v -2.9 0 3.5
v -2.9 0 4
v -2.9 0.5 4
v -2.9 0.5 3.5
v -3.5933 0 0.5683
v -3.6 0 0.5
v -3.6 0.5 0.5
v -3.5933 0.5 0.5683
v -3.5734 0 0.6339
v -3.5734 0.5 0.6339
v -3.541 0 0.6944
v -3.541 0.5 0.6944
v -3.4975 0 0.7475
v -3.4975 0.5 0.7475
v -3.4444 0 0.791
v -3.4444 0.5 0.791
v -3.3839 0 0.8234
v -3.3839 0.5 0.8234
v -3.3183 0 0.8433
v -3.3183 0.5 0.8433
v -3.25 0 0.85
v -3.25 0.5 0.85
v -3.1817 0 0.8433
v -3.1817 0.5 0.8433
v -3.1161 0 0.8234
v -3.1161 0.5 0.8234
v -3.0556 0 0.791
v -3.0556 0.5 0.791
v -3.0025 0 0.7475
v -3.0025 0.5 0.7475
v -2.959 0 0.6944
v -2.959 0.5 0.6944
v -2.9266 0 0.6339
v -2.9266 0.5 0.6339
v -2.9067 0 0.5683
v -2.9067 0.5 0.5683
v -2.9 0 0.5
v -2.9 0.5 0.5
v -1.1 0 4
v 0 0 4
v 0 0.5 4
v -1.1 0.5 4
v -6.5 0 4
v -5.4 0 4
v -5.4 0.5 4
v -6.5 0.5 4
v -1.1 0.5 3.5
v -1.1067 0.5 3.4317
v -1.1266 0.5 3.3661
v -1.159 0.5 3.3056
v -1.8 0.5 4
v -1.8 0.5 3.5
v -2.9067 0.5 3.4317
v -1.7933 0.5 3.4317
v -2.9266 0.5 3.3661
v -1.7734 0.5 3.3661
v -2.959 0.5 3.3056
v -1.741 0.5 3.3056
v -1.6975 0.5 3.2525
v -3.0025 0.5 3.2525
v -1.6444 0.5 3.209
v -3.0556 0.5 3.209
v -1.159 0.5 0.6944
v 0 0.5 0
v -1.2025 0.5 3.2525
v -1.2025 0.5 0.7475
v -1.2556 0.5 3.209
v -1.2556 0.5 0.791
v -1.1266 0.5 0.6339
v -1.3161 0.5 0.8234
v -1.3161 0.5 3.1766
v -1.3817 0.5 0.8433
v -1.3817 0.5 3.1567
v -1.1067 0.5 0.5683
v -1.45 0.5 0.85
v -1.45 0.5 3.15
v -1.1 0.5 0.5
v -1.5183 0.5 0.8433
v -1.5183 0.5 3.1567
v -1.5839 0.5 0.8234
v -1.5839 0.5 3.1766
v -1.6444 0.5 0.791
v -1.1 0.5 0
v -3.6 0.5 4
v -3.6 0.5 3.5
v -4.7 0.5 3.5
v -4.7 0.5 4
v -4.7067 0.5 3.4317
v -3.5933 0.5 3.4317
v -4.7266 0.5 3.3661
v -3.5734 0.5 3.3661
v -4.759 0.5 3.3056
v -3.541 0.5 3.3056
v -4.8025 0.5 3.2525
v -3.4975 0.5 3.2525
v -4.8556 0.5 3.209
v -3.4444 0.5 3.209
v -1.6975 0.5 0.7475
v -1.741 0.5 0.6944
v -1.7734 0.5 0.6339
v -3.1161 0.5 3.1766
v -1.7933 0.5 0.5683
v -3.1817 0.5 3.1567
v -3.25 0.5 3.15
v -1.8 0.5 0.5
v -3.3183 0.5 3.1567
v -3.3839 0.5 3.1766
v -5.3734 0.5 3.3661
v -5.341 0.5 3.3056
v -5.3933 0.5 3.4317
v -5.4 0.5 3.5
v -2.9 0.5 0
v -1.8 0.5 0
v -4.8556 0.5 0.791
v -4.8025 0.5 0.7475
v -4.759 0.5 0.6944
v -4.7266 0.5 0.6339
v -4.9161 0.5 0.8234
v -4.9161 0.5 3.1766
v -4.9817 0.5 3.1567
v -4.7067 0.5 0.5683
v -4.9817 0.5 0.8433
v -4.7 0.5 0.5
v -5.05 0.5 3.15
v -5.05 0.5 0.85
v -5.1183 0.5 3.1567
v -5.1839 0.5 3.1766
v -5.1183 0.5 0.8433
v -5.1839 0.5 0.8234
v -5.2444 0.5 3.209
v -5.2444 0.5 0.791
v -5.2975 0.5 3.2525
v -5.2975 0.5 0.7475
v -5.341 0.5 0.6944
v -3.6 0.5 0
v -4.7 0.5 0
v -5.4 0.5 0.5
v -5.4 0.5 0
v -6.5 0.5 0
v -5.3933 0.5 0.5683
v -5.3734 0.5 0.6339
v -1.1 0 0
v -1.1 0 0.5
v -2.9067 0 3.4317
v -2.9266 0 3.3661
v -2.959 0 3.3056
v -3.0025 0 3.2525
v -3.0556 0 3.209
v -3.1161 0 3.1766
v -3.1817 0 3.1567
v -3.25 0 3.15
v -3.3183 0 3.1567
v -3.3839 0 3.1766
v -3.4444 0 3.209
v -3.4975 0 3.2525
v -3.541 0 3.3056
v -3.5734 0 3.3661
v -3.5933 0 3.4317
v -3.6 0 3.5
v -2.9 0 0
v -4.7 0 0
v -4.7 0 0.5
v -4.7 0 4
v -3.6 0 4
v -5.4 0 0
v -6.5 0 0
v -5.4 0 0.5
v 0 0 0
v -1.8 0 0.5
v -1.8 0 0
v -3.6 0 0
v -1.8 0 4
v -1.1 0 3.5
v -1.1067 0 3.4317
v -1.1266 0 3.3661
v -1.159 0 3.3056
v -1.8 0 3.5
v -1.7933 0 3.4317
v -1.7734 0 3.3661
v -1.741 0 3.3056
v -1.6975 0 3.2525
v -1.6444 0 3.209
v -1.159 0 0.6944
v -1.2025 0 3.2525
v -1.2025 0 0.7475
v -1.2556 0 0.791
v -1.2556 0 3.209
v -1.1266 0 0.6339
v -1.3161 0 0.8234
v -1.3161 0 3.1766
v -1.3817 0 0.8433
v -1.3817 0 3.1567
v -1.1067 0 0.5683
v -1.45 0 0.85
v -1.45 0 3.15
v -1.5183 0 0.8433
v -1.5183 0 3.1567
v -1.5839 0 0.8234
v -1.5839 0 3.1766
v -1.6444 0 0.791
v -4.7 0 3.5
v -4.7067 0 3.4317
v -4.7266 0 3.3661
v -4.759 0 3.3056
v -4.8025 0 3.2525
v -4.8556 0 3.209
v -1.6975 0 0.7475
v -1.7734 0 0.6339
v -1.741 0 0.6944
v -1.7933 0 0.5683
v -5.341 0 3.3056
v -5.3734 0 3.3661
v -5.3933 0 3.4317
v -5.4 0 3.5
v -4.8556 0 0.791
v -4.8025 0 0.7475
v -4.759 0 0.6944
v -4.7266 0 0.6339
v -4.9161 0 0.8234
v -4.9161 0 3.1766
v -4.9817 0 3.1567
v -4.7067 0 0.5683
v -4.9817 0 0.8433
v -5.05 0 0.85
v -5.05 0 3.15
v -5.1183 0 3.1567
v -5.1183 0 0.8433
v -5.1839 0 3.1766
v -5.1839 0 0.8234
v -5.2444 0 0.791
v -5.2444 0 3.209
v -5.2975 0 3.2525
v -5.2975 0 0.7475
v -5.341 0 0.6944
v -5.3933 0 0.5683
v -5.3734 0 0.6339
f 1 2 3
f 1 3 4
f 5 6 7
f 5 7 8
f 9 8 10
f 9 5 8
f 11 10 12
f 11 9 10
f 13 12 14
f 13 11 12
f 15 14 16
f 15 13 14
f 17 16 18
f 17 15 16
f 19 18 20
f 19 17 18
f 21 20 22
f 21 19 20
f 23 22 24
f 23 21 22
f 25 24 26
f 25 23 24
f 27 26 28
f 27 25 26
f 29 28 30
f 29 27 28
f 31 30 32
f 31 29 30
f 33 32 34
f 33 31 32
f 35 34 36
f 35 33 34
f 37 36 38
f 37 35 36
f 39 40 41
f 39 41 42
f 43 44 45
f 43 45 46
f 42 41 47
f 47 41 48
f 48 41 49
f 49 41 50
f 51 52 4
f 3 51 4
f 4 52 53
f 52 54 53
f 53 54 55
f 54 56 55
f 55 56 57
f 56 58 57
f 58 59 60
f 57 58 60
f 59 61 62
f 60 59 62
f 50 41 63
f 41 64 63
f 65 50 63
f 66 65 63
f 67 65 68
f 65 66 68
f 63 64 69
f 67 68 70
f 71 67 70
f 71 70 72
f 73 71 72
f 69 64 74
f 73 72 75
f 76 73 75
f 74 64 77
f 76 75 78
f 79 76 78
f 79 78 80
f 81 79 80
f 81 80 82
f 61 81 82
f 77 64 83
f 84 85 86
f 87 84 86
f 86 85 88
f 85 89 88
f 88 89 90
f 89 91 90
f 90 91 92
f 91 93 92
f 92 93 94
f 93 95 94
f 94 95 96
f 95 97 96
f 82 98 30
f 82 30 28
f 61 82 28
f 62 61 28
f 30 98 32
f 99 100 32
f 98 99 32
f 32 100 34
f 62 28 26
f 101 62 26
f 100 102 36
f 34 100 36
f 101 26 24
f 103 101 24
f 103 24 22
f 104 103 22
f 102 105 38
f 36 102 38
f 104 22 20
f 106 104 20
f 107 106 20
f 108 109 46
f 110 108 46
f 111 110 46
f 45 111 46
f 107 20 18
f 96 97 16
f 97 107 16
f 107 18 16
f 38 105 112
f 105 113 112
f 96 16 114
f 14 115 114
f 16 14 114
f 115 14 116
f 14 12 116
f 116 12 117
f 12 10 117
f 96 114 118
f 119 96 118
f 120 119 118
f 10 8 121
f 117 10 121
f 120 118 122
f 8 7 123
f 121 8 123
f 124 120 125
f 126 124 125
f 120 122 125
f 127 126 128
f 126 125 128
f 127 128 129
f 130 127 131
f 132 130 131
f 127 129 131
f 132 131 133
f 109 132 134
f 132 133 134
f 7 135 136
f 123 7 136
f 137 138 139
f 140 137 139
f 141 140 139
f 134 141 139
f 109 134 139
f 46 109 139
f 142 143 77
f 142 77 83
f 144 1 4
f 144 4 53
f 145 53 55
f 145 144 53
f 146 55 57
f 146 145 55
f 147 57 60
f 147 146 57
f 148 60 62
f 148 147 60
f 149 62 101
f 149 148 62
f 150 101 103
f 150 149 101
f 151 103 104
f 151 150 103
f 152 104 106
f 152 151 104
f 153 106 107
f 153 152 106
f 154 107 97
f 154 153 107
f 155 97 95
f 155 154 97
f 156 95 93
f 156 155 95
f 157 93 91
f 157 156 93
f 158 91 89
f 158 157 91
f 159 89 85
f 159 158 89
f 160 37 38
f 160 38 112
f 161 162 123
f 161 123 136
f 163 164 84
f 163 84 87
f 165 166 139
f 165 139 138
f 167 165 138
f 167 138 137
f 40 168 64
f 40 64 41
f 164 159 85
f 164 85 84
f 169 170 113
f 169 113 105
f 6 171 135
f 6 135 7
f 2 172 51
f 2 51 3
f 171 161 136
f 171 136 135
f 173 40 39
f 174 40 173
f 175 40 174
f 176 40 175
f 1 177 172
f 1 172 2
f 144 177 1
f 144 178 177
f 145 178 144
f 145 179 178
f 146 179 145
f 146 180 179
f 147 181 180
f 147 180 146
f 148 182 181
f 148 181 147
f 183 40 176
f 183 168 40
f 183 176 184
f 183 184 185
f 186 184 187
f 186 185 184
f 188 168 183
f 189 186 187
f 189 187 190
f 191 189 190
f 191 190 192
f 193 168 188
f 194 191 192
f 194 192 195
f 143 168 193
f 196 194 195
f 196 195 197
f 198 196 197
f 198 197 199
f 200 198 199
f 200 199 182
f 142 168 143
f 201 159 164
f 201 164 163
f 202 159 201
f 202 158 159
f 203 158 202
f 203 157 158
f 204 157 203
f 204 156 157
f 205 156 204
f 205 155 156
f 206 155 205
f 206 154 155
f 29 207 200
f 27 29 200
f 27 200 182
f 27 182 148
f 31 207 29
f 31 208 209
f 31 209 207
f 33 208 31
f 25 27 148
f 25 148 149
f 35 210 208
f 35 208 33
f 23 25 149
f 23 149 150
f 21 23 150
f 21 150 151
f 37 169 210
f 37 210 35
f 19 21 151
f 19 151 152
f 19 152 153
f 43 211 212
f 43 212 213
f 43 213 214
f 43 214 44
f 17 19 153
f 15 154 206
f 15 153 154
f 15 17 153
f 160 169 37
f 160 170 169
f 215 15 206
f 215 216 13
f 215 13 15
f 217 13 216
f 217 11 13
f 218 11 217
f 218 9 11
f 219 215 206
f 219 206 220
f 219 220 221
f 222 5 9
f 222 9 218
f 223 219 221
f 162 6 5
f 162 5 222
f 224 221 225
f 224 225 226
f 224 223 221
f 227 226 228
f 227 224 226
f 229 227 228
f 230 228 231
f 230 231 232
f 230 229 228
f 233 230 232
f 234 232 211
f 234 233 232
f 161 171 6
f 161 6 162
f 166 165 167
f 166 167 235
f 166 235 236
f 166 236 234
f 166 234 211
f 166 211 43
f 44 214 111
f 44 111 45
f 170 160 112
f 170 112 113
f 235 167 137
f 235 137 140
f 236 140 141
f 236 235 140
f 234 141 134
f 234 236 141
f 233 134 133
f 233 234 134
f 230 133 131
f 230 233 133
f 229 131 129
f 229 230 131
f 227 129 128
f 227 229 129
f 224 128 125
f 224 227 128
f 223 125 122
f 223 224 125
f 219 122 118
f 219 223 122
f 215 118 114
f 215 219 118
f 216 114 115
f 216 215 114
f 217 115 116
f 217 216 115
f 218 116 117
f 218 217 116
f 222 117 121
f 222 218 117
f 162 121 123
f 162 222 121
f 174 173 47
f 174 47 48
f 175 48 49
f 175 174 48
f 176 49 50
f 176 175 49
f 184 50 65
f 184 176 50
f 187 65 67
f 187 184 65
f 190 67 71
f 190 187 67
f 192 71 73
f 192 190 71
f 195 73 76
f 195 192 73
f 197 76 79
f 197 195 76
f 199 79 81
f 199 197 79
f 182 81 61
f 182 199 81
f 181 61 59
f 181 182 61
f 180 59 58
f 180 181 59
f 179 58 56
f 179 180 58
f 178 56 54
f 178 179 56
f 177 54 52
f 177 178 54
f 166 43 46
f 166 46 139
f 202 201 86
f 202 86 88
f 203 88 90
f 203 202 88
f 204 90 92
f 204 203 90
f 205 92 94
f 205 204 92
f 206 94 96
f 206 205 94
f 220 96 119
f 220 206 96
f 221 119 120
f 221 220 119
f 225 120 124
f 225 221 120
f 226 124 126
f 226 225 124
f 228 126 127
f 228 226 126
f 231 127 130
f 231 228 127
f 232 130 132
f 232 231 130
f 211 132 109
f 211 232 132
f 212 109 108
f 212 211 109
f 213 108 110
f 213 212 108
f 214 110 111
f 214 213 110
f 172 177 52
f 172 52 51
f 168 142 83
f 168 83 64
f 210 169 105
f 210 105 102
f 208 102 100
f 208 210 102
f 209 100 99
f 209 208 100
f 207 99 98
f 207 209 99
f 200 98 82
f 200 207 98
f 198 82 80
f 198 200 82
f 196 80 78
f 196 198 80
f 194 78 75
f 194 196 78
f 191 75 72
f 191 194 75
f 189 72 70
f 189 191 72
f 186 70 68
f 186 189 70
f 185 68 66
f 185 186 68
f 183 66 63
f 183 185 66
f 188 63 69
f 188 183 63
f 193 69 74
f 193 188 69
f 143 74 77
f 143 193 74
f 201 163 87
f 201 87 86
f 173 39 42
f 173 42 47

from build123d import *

# Parameters (mm, degrees)
BOSS_EXTRUDE1_DEPTH = 0.5


with BuildPart() as part:
    # Sketch1 → Boss-Extrude1 (new body)
    with BuildSketch(Plane(origin=(0, 0, 0), x_dir=(1, 0, 0), z_dir=(0, 1, 0))):
        with BuildLine():
            Line((-5.4, 0), (-5.4, -0.5))
            ThreePointArc((-5.4, -0.5), (-5.05, -0.85), (-4.7, -0.5))
            Line((-4.7, -0.5), (-4.7, 0))
            Line((-4.7, 0), (-3.6, 0))
            Line((-3.6, 0), (-3.6, -0.5))
            ThreePointArc((-3.6, -0.5), (-3.25, -0.85), (-2.9, -0.5))
            Line((-2.9, -0.5), (-2.9, 0))
            Line((-2.9, 0), (-1.8, 0))
            Line((-1.8, 0), (-1.8, -0.5))
            ThreePointArc((-1.8, -0.5), (-1.45, -0.85), (-1.1, -0.5))
            Line((-1.1, -0.5), (-1.1, 0))
            Line((-1.1, 0), (0, 0))
            Line((0, 0), (0, -4))
            Line((0, -4), (-1.1, -4))
            Line((-1.1, -4), (-1.1, -3.5))
            ThreePointArc((-1.1, -3.5), (-1.45, -3.15), (-1.8, -3.5))
            Line((-1.8, -3.5), (-1.8, -4))
            Line((-1.8, -4), (-2.9, -4))
            Line((-2.9, -4), (-2.9, -3.5))
            ThreePointArc((-2.9, -3.5), (-3.25, -3.15), (-3.6, -3.5))
            Line((-3.6, -3.5), (-3.6, -4))
            Line((-3.6, -4), (-4.7, -4))
            Line((-4.7, -4), (-4.7, -3.5))
            ThreePointArc((-4.7, -3.5), (-5.05, -3.15), (-5.4, -3.5))
            Line((-5.4, -3.5), (-5.4, -4))
            Line((-5.4, -4), (-6.5, -4))
            Line((-6.5, -4), (-6.5, 0))
            Line((-6.5, 0), (-5.4, 0))
        make_face()
    extrude(amount=BOSS_EXTRUDE1_DEPTH)


solid = part.part
